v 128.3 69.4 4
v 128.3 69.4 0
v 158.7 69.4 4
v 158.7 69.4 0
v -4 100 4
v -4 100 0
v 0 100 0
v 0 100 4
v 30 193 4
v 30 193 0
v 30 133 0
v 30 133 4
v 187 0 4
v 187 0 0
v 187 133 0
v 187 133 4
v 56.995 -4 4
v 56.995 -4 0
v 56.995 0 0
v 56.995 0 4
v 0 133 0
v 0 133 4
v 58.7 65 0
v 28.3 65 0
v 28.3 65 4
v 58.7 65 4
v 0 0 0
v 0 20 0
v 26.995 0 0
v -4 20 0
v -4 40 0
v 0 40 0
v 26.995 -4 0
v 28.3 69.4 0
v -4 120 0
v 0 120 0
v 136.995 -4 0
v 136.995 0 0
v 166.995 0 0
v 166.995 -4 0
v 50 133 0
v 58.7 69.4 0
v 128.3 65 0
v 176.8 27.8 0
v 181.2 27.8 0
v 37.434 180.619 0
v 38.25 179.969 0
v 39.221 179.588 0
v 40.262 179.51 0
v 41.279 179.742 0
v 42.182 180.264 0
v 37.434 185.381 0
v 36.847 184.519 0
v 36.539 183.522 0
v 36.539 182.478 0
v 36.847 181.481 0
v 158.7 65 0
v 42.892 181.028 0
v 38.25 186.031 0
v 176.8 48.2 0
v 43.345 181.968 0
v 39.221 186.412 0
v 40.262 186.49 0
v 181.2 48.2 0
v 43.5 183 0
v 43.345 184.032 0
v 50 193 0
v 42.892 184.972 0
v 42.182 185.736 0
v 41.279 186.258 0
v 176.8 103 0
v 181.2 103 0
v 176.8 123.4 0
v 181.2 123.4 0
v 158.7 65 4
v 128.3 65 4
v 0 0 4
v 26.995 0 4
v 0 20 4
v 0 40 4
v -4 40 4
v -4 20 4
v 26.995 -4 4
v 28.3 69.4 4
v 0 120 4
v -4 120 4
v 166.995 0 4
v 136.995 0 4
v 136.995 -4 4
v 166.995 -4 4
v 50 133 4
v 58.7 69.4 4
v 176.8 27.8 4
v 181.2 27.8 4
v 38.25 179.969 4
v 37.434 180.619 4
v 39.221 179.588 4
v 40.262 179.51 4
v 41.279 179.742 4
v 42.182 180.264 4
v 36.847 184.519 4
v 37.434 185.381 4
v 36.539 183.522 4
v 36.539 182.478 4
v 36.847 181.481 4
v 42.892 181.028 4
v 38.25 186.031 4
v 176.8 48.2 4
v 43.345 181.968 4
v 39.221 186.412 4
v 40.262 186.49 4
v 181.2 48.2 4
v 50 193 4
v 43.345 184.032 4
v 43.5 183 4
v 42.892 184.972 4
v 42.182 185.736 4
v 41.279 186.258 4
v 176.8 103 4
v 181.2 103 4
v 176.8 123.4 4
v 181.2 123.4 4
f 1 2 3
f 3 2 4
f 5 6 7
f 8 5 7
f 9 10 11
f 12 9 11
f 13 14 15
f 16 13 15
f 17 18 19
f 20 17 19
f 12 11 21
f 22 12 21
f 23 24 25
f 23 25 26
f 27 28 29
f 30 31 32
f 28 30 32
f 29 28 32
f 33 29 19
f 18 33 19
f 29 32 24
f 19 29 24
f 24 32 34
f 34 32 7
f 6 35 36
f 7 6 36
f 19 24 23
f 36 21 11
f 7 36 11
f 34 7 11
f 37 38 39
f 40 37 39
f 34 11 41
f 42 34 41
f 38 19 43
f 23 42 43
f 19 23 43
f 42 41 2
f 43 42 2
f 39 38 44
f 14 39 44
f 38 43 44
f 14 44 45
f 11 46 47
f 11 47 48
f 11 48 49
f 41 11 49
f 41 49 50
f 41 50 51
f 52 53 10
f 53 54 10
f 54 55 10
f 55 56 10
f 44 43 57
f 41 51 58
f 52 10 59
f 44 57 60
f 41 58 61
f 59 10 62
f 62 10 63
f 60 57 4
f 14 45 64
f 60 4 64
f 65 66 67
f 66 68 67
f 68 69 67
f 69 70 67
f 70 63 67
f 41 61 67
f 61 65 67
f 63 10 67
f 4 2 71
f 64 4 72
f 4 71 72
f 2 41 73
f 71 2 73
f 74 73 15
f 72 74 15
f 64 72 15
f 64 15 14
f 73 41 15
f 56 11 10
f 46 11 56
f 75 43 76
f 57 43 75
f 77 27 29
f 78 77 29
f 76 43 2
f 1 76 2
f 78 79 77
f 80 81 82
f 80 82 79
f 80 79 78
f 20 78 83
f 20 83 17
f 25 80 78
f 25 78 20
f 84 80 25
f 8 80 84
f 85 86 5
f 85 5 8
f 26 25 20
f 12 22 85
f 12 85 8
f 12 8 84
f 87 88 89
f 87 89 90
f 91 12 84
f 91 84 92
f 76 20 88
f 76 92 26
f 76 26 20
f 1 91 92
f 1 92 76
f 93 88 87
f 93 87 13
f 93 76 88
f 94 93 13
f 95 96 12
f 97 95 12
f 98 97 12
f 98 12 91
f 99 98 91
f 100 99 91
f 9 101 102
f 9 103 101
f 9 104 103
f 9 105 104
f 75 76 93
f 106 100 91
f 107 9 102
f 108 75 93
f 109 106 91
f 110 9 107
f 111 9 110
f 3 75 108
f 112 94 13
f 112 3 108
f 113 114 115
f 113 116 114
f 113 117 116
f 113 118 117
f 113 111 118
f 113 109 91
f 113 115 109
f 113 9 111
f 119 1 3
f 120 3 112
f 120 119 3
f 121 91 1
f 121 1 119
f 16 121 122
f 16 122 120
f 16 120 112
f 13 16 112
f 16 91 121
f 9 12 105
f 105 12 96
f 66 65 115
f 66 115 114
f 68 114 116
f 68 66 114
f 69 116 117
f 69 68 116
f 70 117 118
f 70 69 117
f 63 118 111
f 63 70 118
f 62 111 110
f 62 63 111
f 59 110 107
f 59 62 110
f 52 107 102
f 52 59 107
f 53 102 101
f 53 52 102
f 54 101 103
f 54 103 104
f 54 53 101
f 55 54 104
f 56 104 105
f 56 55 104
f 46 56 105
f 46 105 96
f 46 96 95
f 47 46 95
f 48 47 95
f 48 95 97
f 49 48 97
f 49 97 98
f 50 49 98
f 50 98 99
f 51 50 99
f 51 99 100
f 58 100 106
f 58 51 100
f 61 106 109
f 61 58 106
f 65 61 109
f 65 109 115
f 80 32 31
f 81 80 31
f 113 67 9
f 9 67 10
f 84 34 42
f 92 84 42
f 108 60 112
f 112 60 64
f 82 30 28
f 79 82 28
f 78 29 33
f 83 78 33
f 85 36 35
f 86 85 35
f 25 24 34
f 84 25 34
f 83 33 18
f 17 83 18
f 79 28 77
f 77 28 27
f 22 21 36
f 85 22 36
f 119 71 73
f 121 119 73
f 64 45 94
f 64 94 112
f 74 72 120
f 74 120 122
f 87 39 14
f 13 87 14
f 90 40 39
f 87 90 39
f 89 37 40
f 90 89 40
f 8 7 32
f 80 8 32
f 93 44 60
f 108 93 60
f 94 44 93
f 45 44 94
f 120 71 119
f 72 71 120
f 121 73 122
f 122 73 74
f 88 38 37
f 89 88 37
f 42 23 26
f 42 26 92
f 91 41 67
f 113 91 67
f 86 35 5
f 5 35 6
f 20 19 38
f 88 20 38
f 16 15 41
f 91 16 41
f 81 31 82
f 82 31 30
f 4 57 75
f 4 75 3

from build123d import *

# Parameters (mm, degrees)
SKETCH_1_W      = 30.4
SKETCH_1_H      = 4.4
SKETCH_1_W_2    = 4.4
SKETCH_1_H_2    = 20.4
SKETCH_1_R      = 3.5
EXTRUDE_1_DEPTH = 4


with BuildPart() as part:
    # Эскиз1 → Бобышка-Вытянуть1 (new body)
    with BuildSketch(Plane.XY):
        Polygon((0, 20), (0, 0), (26.99543951, 0), (26.99543951, -4), (56.99543951, -4), (56.99543951, 0), (136.99543951, 0), (136.99543951, -4), (166.99543951, -4), (166.99543951, 0), (187, 0), (187, 133), (50, 133), (50, 193), (30, 193), (30, 133), (0, 133), (0, 120), (-4, 120), (-4, 100), (0, 100), (0, 40), (-4, 40), (-4, 20), align=None)
        with Locations((43.5, 67.2)):
            Rectangle(SKETCH_1_W, SKETCH_1_H, mode=Mode.SUBTRACT)
        with Locations((179, 38)):
            Rectangle(SKETCH_1_W_2, SKETCH_1_H_2, mode=Mode.SUBTRACT)
        with Locations((143.5, 67.2)):
            Rectangle(SKETCH_1_W, SKETCH_1_H, mode=Mode.SUBTRACT)
        with Locations((179, 113.2)):
            Rectangle(SKETCH_1_W_2, SKETCH_1_H_2, mode=Mode.SUBTRACT)
        with Locations((40, 183)):
            Circle(SKETCH_1_R, mode=Mode.SUBTRACT)
    extrude(amount=EXTRUDE_1_DEPTH)


solid = part.part
